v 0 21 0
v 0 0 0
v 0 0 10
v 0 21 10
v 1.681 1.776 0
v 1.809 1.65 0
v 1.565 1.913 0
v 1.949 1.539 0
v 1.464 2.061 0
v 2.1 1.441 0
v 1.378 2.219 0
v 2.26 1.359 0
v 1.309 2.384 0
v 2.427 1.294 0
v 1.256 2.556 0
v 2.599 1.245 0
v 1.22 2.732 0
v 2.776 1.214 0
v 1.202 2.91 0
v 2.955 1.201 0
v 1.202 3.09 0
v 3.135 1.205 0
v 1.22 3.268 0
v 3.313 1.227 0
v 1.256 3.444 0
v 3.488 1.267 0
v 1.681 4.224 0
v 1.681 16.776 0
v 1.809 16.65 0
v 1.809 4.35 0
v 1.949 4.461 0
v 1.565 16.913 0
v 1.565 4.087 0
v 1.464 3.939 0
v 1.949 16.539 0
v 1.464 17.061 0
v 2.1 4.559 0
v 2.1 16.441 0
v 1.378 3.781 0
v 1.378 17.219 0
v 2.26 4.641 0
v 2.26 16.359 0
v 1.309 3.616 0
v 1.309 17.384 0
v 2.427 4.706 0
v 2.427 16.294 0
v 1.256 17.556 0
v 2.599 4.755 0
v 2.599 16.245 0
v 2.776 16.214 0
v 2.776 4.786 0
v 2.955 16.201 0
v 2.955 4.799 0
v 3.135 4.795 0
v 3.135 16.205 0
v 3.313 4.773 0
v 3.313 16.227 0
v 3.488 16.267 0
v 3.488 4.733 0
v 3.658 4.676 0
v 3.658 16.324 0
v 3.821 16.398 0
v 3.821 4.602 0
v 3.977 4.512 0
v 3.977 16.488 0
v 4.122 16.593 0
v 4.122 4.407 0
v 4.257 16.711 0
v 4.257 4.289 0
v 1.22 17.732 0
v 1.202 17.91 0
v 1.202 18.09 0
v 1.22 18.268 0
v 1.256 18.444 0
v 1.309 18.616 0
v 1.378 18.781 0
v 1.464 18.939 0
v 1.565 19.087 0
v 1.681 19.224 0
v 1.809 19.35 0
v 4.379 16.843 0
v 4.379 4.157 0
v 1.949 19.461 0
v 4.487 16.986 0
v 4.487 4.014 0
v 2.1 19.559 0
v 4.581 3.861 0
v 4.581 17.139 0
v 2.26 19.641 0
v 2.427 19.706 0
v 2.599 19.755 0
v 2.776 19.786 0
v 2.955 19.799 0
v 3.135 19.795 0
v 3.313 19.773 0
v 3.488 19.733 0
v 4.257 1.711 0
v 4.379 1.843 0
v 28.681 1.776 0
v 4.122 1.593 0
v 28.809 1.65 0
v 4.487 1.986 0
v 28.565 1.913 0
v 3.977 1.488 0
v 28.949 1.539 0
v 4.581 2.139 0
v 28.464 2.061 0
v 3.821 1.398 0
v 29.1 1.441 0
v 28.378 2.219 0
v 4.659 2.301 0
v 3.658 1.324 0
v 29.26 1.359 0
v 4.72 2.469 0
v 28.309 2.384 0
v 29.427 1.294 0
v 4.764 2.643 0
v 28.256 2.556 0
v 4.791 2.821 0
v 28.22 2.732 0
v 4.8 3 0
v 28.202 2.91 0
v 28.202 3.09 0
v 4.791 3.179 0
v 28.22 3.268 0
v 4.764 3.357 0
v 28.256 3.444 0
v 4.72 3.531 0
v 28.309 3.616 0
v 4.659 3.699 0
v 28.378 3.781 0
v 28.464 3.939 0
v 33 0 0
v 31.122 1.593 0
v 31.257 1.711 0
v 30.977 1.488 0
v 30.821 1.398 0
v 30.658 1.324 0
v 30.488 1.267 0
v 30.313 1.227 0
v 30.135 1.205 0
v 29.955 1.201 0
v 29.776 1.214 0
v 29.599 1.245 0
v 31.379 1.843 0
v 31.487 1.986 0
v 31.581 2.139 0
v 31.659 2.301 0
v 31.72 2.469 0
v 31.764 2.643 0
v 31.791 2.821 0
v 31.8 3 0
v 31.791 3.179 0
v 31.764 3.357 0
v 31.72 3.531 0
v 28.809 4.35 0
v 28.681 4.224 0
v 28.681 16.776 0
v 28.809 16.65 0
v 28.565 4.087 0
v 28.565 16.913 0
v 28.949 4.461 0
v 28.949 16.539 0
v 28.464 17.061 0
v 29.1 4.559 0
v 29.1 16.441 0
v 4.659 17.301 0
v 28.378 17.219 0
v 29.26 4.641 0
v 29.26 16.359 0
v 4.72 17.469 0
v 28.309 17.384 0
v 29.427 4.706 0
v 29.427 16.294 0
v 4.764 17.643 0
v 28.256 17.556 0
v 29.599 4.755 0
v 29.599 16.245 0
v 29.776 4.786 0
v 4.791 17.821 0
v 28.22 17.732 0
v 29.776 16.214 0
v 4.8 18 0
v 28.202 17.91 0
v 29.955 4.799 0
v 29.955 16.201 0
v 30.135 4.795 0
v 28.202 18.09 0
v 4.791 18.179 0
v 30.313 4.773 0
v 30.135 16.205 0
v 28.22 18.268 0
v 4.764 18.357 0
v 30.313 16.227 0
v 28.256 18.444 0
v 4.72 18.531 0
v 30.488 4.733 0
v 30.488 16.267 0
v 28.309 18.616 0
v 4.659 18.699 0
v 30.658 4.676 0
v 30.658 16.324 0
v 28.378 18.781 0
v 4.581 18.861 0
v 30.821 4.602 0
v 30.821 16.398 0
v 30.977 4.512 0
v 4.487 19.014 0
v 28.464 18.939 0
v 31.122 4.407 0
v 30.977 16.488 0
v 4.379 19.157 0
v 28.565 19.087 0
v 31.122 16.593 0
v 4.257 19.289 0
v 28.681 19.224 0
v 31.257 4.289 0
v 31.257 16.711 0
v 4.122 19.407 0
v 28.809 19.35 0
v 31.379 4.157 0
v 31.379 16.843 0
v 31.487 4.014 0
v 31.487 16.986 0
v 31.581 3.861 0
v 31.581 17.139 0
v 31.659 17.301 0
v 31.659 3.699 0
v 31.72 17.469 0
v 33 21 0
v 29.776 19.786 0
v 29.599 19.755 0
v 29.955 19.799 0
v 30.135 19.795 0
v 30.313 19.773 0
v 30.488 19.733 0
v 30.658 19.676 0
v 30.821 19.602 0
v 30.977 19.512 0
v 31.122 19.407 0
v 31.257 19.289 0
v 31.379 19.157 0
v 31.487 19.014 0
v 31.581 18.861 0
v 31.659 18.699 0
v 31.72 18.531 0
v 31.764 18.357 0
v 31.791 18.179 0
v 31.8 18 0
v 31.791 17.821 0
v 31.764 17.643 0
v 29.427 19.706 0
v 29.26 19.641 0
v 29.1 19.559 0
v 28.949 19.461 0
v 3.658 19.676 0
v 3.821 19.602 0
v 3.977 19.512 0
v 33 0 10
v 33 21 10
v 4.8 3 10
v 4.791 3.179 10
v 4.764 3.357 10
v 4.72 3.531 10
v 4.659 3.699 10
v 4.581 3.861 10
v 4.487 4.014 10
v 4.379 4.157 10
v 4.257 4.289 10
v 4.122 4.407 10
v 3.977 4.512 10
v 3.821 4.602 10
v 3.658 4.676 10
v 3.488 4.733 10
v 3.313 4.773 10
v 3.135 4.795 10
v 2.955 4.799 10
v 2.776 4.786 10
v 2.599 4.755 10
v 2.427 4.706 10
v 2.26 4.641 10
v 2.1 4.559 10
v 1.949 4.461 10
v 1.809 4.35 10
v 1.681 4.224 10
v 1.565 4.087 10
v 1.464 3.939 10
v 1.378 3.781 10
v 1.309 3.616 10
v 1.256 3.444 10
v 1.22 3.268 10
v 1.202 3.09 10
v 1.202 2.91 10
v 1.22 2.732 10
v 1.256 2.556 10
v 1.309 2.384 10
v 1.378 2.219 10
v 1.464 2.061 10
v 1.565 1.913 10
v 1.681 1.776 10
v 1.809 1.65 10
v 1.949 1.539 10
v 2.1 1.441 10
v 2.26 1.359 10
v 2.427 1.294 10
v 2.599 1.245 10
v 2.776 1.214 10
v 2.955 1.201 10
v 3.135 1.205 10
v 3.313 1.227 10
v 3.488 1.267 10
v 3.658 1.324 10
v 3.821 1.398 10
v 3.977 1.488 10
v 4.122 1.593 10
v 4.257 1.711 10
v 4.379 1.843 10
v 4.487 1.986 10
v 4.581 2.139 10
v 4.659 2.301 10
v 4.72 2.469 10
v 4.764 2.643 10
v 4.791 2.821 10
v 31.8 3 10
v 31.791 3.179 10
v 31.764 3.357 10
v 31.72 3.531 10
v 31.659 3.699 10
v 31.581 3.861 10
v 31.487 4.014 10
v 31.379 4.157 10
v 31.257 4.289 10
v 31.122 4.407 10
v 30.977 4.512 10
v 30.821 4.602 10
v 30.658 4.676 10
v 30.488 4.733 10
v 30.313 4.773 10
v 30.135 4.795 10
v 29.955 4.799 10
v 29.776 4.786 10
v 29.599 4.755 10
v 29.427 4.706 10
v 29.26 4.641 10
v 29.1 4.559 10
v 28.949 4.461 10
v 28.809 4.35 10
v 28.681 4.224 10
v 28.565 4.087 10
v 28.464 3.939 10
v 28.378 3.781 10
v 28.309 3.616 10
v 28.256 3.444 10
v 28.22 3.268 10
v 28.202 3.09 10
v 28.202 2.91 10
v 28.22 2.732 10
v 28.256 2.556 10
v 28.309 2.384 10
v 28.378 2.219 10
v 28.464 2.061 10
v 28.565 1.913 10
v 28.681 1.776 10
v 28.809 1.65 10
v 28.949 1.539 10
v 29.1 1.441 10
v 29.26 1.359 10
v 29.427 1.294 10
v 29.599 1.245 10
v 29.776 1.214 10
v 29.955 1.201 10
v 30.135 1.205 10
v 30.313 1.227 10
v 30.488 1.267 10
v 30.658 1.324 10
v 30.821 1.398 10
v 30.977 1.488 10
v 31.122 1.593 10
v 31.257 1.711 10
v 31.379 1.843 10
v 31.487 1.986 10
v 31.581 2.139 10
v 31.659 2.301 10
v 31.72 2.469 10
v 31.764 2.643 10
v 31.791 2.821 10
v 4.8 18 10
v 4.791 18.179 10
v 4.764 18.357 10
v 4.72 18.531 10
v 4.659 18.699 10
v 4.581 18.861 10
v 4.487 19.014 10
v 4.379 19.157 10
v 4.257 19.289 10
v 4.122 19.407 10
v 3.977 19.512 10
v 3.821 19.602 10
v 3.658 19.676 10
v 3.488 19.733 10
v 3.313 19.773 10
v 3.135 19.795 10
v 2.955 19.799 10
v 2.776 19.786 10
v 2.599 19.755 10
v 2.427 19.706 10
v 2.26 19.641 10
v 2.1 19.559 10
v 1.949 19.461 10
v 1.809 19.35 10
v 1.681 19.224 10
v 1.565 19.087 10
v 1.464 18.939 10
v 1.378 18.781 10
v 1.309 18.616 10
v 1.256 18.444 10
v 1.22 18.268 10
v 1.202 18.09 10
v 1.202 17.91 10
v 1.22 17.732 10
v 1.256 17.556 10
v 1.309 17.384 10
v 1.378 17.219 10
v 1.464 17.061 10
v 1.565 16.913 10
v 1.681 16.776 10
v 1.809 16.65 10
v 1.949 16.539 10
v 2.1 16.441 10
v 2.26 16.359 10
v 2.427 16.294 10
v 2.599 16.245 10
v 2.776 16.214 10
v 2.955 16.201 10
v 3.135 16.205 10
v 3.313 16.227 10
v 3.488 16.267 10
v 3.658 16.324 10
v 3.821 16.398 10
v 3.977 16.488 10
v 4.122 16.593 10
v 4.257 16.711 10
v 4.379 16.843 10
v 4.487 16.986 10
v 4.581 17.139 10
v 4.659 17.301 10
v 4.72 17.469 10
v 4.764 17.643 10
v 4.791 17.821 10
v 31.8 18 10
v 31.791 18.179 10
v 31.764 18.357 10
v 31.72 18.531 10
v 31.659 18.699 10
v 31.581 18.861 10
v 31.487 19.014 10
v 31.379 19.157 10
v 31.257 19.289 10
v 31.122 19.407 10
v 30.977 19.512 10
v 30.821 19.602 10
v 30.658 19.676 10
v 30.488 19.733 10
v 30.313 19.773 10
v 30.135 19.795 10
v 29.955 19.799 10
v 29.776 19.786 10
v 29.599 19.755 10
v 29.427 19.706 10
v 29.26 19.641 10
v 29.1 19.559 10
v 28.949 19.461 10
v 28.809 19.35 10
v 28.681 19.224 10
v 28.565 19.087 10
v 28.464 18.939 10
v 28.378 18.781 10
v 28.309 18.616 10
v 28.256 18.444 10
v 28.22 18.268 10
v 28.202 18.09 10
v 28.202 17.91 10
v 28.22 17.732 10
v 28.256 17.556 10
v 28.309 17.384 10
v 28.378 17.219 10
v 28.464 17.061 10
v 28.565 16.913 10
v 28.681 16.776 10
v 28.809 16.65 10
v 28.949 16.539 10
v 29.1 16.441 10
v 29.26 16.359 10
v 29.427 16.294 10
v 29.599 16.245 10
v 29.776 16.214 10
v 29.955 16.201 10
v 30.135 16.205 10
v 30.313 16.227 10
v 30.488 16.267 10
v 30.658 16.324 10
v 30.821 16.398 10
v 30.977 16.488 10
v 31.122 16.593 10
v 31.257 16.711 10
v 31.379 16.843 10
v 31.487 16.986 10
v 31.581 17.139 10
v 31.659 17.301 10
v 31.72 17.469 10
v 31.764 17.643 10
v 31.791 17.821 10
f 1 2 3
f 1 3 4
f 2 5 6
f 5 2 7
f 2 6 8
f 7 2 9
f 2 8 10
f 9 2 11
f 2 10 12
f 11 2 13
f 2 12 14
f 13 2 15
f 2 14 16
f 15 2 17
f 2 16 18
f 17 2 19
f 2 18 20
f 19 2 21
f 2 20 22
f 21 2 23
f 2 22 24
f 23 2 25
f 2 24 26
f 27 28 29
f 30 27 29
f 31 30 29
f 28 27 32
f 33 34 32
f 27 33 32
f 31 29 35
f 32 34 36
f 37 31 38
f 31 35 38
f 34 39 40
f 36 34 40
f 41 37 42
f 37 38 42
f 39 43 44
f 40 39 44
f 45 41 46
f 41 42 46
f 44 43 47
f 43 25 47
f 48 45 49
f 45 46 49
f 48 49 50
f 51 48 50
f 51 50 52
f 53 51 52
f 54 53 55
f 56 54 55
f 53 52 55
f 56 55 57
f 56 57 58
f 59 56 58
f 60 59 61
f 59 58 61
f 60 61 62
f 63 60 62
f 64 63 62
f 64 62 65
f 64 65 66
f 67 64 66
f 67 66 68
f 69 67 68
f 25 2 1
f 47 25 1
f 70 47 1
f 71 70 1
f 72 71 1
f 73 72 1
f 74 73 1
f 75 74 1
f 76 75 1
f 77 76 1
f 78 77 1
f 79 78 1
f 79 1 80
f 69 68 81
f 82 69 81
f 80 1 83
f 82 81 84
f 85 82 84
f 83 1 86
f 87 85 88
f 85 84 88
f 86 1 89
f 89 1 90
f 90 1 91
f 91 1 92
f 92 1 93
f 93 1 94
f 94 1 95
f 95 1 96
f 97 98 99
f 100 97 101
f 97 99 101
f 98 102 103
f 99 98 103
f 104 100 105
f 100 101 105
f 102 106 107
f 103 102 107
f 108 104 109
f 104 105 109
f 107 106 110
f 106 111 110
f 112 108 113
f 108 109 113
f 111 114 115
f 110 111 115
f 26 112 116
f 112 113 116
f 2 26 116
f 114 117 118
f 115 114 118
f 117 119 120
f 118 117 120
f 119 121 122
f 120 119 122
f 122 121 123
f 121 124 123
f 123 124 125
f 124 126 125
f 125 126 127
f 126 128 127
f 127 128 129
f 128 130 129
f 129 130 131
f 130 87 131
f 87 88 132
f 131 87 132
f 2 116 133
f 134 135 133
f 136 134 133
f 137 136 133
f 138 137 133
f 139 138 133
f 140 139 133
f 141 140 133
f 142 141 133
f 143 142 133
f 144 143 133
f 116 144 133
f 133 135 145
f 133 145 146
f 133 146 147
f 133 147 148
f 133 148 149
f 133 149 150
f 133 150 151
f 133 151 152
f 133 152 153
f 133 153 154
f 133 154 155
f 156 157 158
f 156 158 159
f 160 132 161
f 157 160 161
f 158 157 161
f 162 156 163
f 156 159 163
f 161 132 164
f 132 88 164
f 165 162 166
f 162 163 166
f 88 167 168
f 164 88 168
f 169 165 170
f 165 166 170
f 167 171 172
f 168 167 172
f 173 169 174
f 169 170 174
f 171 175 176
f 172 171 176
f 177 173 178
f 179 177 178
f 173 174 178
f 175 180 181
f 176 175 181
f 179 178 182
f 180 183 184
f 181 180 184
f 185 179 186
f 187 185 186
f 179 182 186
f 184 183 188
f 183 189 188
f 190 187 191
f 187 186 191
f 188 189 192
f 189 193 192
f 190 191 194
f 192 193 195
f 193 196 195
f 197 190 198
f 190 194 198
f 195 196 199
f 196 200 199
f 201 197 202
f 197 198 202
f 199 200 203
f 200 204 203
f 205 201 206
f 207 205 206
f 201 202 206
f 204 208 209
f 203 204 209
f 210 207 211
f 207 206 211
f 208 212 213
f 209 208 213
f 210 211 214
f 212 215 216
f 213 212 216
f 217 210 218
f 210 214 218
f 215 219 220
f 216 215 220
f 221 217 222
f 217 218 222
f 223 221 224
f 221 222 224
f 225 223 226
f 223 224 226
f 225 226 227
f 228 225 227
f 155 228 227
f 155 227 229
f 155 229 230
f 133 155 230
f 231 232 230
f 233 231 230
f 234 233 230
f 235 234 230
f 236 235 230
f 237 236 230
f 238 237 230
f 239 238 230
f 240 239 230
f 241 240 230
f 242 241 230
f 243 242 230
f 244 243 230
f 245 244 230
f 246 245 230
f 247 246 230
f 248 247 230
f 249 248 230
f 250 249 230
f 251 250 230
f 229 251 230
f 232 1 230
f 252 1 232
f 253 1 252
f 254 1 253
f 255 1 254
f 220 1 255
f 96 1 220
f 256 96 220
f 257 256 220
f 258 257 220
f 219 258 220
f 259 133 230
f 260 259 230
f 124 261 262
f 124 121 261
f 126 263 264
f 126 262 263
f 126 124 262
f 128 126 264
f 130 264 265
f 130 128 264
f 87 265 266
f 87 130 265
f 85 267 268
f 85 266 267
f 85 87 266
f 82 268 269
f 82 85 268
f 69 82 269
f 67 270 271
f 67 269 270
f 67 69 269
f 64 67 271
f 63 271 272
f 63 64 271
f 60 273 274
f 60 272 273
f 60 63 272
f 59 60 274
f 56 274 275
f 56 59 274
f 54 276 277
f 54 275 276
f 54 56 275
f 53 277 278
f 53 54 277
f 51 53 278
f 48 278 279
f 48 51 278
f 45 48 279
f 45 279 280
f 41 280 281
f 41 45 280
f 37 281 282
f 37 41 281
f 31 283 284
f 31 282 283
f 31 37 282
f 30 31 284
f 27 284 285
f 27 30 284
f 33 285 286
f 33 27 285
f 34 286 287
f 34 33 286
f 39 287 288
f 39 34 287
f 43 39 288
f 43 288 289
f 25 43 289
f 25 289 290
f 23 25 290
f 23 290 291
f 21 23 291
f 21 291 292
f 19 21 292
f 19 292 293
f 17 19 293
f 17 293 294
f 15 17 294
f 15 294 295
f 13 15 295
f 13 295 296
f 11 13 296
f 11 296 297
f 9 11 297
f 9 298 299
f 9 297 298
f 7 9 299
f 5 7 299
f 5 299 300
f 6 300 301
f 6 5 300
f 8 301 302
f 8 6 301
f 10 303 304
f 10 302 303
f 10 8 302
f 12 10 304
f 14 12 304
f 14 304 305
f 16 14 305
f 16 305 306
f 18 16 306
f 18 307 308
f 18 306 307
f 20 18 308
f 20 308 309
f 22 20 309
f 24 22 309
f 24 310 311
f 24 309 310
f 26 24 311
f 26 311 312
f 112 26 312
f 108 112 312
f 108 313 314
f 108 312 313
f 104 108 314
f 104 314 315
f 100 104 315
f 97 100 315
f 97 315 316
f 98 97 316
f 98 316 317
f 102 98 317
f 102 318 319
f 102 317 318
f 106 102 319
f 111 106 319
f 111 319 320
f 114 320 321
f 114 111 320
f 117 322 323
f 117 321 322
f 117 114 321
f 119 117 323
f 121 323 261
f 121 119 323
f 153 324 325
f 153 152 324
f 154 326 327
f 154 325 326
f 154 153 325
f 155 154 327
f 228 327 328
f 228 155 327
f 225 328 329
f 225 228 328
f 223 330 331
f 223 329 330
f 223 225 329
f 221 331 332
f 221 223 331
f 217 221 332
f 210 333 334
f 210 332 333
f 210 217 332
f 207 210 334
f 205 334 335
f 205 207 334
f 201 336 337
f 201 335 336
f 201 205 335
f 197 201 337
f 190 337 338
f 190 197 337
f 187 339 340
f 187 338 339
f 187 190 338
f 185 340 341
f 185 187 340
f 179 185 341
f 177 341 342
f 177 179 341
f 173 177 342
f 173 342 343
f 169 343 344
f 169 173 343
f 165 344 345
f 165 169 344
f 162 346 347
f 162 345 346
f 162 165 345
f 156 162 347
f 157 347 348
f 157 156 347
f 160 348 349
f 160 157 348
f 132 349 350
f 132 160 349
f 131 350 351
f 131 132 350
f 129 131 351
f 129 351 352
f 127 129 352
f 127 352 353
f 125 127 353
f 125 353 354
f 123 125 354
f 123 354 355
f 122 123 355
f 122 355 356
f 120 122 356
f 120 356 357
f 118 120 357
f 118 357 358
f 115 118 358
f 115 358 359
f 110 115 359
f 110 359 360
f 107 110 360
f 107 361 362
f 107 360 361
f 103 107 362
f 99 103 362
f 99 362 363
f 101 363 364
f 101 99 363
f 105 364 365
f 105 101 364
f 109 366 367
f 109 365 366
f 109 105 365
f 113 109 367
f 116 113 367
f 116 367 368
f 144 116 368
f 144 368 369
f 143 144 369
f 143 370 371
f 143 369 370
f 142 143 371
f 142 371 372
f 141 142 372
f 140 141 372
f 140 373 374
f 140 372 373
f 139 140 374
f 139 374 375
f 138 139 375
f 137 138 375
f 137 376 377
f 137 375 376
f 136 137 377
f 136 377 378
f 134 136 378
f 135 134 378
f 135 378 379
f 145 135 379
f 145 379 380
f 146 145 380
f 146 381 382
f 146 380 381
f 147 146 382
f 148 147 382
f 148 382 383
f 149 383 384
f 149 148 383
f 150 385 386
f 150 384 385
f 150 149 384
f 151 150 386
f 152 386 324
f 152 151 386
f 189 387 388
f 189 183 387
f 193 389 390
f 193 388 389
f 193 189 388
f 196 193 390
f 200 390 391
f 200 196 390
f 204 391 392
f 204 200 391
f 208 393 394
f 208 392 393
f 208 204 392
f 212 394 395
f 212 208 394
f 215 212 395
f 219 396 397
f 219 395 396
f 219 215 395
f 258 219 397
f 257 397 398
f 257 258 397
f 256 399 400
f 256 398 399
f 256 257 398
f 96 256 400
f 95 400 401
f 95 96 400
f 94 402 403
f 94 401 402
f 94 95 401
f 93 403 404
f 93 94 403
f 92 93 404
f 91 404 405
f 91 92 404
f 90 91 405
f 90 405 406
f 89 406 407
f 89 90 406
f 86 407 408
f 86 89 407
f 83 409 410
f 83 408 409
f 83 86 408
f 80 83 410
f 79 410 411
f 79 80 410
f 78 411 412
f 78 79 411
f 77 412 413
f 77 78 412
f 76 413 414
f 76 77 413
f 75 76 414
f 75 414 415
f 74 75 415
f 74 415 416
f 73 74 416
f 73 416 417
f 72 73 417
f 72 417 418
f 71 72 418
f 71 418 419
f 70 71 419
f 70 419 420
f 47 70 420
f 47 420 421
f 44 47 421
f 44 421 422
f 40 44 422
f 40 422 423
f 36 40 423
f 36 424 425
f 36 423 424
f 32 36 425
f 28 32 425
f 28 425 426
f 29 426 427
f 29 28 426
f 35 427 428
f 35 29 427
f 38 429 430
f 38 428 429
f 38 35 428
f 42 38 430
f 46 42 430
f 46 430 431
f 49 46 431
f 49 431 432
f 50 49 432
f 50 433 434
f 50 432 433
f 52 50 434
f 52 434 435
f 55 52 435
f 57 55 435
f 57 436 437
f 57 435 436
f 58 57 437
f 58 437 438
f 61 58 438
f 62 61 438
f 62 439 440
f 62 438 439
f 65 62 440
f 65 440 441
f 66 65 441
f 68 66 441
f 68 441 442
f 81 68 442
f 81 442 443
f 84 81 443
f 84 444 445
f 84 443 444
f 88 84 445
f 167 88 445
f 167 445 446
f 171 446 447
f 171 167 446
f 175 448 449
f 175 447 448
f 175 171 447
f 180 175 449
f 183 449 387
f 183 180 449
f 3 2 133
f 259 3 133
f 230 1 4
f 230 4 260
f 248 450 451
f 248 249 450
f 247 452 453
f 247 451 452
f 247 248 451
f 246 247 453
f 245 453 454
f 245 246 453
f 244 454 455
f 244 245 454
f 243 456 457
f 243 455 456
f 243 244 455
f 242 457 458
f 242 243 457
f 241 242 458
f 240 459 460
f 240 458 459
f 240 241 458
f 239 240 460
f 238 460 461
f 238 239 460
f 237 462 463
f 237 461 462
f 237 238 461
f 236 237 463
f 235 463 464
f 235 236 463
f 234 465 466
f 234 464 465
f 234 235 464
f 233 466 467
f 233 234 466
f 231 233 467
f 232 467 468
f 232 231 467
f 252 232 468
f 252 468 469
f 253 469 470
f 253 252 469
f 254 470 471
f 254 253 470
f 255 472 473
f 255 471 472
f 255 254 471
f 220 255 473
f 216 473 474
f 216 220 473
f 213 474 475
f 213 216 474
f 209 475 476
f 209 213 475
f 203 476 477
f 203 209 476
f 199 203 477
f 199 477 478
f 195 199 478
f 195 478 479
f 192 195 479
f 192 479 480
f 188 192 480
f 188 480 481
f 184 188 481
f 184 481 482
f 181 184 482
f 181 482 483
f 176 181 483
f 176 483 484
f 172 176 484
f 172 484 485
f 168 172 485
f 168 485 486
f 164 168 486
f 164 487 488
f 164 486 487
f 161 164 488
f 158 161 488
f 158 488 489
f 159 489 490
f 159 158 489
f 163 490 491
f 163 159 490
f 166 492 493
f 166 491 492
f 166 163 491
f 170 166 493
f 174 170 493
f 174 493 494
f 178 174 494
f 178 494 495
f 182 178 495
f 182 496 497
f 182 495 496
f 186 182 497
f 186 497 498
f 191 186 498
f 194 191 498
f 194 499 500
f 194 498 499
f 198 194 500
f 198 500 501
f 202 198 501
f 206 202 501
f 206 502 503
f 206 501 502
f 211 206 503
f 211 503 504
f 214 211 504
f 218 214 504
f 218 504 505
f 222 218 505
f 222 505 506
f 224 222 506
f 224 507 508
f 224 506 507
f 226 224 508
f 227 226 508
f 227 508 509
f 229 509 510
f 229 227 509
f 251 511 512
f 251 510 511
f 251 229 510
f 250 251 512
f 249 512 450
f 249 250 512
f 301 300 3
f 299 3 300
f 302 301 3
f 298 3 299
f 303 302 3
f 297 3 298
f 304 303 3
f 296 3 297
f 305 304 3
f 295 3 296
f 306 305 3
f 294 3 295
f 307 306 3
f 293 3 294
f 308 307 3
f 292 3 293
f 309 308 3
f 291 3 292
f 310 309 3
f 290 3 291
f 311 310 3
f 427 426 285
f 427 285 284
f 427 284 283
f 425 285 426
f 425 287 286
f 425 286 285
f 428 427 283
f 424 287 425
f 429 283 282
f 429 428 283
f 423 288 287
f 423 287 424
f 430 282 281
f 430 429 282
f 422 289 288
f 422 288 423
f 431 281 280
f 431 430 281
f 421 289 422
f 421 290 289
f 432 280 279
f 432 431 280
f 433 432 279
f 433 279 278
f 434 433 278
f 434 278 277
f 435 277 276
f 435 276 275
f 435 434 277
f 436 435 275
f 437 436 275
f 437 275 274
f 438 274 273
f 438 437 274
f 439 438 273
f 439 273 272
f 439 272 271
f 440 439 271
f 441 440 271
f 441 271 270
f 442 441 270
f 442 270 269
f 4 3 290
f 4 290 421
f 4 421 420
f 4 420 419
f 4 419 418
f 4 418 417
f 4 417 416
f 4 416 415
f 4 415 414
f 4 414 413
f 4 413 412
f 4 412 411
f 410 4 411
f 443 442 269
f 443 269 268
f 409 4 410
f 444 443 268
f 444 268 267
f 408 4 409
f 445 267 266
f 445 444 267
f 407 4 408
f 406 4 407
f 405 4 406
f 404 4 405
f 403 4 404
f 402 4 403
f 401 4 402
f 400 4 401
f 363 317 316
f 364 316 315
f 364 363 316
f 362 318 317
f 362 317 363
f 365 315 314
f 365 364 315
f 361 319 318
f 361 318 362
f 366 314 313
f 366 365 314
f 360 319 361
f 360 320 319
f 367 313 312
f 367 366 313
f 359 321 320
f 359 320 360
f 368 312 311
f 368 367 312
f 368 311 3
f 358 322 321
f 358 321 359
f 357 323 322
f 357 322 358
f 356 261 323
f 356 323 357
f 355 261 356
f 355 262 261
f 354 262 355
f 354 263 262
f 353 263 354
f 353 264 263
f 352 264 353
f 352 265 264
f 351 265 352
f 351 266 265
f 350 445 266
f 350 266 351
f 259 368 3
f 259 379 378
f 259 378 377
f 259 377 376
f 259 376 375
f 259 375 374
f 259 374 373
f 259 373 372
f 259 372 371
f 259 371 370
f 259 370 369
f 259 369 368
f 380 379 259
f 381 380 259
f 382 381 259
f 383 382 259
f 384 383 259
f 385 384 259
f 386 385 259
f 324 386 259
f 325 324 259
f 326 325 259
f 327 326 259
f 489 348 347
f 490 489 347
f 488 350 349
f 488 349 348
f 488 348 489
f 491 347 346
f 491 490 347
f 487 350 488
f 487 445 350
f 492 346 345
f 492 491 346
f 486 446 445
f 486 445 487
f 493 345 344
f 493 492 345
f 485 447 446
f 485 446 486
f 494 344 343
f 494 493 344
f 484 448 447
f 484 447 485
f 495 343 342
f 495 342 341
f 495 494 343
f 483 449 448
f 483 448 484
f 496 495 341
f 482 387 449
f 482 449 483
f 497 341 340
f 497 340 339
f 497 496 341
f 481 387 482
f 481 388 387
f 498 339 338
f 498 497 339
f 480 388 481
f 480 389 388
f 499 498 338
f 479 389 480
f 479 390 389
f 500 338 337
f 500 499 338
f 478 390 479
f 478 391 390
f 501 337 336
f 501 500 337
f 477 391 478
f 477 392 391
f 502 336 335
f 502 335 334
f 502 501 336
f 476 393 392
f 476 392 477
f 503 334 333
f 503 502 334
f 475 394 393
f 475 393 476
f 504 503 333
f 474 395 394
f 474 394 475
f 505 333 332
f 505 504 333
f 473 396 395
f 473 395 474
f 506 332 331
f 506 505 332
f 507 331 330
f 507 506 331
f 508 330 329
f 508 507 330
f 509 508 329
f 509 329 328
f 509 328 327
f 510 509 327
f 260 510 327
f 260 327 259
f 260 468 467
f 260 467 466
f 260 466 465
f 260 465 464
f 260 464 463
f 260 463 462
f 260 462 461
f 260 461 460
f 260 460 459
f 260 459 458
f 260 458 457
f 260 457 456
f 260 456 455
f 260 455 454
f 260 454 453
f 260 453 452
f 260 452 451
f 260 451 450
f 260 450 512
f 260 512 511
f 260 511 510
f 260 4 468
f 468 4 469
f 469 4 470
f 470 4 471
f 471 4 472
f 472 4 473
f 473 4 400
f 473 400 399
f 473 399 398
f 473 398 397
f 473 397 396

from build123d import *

# Parameters (mm, degrees)
CYLINDER002_R     = 1.8
CYLINDER002_DEPTH = 50
ARRAY002_X_COUNT  = 2
ARRAY002_X_PITCH  = 27
ARRAY002_Y_COUNT  = 2
ARRAY002_Y_PITCH  = 15
BOX003_W          = 33
BOX003_H          = 21
BOX003_DEPTH      = 10


with BuildPart() as array002:
    # Cylinder002 → Cylinder002 (new body)
    with BuildSketch(Plane(origin=(3, 3, -10), x_dir=(1, 0, 0), z_dir=(0, 0, 1))):
        Circle(CYLINDER002_R)
    extrude(amount=CYLINDER002_DEPTH)

    # Array002 X: Array002 ×2


with BuildPart() as array002_1:
    add(array002.part)
    with Locations(*[(i * ARRAY002_X_PITCH, 0, 0) for i in range(1, ARRAY002_X_COUNT)]):
        add(array002.part)

    # Array002 Y: Array002 ×2


with BuildPart() as array002_2:
    add(array002_1.part)
    with Locations(*[(0, i * ARRAY002_Y_PITCH, 0) for i in range(1, ARRAY002_Y_COUNT)]):
        add(array002_1.part)


with BuildPart() as cut002:
    # Box003 → Box003 (new body)
    with BuildSketch(Plane.XY):
        with Locations((16.5, 10.5)):
            Rectangle(BOX003_W, BOX003_H)
    extrude(amount=BOX003_DEPTH)

    # Cut002: cut Array002
    add(array002_2.part, mode=Mode.SUBTRACT)


solid = cut002.part
